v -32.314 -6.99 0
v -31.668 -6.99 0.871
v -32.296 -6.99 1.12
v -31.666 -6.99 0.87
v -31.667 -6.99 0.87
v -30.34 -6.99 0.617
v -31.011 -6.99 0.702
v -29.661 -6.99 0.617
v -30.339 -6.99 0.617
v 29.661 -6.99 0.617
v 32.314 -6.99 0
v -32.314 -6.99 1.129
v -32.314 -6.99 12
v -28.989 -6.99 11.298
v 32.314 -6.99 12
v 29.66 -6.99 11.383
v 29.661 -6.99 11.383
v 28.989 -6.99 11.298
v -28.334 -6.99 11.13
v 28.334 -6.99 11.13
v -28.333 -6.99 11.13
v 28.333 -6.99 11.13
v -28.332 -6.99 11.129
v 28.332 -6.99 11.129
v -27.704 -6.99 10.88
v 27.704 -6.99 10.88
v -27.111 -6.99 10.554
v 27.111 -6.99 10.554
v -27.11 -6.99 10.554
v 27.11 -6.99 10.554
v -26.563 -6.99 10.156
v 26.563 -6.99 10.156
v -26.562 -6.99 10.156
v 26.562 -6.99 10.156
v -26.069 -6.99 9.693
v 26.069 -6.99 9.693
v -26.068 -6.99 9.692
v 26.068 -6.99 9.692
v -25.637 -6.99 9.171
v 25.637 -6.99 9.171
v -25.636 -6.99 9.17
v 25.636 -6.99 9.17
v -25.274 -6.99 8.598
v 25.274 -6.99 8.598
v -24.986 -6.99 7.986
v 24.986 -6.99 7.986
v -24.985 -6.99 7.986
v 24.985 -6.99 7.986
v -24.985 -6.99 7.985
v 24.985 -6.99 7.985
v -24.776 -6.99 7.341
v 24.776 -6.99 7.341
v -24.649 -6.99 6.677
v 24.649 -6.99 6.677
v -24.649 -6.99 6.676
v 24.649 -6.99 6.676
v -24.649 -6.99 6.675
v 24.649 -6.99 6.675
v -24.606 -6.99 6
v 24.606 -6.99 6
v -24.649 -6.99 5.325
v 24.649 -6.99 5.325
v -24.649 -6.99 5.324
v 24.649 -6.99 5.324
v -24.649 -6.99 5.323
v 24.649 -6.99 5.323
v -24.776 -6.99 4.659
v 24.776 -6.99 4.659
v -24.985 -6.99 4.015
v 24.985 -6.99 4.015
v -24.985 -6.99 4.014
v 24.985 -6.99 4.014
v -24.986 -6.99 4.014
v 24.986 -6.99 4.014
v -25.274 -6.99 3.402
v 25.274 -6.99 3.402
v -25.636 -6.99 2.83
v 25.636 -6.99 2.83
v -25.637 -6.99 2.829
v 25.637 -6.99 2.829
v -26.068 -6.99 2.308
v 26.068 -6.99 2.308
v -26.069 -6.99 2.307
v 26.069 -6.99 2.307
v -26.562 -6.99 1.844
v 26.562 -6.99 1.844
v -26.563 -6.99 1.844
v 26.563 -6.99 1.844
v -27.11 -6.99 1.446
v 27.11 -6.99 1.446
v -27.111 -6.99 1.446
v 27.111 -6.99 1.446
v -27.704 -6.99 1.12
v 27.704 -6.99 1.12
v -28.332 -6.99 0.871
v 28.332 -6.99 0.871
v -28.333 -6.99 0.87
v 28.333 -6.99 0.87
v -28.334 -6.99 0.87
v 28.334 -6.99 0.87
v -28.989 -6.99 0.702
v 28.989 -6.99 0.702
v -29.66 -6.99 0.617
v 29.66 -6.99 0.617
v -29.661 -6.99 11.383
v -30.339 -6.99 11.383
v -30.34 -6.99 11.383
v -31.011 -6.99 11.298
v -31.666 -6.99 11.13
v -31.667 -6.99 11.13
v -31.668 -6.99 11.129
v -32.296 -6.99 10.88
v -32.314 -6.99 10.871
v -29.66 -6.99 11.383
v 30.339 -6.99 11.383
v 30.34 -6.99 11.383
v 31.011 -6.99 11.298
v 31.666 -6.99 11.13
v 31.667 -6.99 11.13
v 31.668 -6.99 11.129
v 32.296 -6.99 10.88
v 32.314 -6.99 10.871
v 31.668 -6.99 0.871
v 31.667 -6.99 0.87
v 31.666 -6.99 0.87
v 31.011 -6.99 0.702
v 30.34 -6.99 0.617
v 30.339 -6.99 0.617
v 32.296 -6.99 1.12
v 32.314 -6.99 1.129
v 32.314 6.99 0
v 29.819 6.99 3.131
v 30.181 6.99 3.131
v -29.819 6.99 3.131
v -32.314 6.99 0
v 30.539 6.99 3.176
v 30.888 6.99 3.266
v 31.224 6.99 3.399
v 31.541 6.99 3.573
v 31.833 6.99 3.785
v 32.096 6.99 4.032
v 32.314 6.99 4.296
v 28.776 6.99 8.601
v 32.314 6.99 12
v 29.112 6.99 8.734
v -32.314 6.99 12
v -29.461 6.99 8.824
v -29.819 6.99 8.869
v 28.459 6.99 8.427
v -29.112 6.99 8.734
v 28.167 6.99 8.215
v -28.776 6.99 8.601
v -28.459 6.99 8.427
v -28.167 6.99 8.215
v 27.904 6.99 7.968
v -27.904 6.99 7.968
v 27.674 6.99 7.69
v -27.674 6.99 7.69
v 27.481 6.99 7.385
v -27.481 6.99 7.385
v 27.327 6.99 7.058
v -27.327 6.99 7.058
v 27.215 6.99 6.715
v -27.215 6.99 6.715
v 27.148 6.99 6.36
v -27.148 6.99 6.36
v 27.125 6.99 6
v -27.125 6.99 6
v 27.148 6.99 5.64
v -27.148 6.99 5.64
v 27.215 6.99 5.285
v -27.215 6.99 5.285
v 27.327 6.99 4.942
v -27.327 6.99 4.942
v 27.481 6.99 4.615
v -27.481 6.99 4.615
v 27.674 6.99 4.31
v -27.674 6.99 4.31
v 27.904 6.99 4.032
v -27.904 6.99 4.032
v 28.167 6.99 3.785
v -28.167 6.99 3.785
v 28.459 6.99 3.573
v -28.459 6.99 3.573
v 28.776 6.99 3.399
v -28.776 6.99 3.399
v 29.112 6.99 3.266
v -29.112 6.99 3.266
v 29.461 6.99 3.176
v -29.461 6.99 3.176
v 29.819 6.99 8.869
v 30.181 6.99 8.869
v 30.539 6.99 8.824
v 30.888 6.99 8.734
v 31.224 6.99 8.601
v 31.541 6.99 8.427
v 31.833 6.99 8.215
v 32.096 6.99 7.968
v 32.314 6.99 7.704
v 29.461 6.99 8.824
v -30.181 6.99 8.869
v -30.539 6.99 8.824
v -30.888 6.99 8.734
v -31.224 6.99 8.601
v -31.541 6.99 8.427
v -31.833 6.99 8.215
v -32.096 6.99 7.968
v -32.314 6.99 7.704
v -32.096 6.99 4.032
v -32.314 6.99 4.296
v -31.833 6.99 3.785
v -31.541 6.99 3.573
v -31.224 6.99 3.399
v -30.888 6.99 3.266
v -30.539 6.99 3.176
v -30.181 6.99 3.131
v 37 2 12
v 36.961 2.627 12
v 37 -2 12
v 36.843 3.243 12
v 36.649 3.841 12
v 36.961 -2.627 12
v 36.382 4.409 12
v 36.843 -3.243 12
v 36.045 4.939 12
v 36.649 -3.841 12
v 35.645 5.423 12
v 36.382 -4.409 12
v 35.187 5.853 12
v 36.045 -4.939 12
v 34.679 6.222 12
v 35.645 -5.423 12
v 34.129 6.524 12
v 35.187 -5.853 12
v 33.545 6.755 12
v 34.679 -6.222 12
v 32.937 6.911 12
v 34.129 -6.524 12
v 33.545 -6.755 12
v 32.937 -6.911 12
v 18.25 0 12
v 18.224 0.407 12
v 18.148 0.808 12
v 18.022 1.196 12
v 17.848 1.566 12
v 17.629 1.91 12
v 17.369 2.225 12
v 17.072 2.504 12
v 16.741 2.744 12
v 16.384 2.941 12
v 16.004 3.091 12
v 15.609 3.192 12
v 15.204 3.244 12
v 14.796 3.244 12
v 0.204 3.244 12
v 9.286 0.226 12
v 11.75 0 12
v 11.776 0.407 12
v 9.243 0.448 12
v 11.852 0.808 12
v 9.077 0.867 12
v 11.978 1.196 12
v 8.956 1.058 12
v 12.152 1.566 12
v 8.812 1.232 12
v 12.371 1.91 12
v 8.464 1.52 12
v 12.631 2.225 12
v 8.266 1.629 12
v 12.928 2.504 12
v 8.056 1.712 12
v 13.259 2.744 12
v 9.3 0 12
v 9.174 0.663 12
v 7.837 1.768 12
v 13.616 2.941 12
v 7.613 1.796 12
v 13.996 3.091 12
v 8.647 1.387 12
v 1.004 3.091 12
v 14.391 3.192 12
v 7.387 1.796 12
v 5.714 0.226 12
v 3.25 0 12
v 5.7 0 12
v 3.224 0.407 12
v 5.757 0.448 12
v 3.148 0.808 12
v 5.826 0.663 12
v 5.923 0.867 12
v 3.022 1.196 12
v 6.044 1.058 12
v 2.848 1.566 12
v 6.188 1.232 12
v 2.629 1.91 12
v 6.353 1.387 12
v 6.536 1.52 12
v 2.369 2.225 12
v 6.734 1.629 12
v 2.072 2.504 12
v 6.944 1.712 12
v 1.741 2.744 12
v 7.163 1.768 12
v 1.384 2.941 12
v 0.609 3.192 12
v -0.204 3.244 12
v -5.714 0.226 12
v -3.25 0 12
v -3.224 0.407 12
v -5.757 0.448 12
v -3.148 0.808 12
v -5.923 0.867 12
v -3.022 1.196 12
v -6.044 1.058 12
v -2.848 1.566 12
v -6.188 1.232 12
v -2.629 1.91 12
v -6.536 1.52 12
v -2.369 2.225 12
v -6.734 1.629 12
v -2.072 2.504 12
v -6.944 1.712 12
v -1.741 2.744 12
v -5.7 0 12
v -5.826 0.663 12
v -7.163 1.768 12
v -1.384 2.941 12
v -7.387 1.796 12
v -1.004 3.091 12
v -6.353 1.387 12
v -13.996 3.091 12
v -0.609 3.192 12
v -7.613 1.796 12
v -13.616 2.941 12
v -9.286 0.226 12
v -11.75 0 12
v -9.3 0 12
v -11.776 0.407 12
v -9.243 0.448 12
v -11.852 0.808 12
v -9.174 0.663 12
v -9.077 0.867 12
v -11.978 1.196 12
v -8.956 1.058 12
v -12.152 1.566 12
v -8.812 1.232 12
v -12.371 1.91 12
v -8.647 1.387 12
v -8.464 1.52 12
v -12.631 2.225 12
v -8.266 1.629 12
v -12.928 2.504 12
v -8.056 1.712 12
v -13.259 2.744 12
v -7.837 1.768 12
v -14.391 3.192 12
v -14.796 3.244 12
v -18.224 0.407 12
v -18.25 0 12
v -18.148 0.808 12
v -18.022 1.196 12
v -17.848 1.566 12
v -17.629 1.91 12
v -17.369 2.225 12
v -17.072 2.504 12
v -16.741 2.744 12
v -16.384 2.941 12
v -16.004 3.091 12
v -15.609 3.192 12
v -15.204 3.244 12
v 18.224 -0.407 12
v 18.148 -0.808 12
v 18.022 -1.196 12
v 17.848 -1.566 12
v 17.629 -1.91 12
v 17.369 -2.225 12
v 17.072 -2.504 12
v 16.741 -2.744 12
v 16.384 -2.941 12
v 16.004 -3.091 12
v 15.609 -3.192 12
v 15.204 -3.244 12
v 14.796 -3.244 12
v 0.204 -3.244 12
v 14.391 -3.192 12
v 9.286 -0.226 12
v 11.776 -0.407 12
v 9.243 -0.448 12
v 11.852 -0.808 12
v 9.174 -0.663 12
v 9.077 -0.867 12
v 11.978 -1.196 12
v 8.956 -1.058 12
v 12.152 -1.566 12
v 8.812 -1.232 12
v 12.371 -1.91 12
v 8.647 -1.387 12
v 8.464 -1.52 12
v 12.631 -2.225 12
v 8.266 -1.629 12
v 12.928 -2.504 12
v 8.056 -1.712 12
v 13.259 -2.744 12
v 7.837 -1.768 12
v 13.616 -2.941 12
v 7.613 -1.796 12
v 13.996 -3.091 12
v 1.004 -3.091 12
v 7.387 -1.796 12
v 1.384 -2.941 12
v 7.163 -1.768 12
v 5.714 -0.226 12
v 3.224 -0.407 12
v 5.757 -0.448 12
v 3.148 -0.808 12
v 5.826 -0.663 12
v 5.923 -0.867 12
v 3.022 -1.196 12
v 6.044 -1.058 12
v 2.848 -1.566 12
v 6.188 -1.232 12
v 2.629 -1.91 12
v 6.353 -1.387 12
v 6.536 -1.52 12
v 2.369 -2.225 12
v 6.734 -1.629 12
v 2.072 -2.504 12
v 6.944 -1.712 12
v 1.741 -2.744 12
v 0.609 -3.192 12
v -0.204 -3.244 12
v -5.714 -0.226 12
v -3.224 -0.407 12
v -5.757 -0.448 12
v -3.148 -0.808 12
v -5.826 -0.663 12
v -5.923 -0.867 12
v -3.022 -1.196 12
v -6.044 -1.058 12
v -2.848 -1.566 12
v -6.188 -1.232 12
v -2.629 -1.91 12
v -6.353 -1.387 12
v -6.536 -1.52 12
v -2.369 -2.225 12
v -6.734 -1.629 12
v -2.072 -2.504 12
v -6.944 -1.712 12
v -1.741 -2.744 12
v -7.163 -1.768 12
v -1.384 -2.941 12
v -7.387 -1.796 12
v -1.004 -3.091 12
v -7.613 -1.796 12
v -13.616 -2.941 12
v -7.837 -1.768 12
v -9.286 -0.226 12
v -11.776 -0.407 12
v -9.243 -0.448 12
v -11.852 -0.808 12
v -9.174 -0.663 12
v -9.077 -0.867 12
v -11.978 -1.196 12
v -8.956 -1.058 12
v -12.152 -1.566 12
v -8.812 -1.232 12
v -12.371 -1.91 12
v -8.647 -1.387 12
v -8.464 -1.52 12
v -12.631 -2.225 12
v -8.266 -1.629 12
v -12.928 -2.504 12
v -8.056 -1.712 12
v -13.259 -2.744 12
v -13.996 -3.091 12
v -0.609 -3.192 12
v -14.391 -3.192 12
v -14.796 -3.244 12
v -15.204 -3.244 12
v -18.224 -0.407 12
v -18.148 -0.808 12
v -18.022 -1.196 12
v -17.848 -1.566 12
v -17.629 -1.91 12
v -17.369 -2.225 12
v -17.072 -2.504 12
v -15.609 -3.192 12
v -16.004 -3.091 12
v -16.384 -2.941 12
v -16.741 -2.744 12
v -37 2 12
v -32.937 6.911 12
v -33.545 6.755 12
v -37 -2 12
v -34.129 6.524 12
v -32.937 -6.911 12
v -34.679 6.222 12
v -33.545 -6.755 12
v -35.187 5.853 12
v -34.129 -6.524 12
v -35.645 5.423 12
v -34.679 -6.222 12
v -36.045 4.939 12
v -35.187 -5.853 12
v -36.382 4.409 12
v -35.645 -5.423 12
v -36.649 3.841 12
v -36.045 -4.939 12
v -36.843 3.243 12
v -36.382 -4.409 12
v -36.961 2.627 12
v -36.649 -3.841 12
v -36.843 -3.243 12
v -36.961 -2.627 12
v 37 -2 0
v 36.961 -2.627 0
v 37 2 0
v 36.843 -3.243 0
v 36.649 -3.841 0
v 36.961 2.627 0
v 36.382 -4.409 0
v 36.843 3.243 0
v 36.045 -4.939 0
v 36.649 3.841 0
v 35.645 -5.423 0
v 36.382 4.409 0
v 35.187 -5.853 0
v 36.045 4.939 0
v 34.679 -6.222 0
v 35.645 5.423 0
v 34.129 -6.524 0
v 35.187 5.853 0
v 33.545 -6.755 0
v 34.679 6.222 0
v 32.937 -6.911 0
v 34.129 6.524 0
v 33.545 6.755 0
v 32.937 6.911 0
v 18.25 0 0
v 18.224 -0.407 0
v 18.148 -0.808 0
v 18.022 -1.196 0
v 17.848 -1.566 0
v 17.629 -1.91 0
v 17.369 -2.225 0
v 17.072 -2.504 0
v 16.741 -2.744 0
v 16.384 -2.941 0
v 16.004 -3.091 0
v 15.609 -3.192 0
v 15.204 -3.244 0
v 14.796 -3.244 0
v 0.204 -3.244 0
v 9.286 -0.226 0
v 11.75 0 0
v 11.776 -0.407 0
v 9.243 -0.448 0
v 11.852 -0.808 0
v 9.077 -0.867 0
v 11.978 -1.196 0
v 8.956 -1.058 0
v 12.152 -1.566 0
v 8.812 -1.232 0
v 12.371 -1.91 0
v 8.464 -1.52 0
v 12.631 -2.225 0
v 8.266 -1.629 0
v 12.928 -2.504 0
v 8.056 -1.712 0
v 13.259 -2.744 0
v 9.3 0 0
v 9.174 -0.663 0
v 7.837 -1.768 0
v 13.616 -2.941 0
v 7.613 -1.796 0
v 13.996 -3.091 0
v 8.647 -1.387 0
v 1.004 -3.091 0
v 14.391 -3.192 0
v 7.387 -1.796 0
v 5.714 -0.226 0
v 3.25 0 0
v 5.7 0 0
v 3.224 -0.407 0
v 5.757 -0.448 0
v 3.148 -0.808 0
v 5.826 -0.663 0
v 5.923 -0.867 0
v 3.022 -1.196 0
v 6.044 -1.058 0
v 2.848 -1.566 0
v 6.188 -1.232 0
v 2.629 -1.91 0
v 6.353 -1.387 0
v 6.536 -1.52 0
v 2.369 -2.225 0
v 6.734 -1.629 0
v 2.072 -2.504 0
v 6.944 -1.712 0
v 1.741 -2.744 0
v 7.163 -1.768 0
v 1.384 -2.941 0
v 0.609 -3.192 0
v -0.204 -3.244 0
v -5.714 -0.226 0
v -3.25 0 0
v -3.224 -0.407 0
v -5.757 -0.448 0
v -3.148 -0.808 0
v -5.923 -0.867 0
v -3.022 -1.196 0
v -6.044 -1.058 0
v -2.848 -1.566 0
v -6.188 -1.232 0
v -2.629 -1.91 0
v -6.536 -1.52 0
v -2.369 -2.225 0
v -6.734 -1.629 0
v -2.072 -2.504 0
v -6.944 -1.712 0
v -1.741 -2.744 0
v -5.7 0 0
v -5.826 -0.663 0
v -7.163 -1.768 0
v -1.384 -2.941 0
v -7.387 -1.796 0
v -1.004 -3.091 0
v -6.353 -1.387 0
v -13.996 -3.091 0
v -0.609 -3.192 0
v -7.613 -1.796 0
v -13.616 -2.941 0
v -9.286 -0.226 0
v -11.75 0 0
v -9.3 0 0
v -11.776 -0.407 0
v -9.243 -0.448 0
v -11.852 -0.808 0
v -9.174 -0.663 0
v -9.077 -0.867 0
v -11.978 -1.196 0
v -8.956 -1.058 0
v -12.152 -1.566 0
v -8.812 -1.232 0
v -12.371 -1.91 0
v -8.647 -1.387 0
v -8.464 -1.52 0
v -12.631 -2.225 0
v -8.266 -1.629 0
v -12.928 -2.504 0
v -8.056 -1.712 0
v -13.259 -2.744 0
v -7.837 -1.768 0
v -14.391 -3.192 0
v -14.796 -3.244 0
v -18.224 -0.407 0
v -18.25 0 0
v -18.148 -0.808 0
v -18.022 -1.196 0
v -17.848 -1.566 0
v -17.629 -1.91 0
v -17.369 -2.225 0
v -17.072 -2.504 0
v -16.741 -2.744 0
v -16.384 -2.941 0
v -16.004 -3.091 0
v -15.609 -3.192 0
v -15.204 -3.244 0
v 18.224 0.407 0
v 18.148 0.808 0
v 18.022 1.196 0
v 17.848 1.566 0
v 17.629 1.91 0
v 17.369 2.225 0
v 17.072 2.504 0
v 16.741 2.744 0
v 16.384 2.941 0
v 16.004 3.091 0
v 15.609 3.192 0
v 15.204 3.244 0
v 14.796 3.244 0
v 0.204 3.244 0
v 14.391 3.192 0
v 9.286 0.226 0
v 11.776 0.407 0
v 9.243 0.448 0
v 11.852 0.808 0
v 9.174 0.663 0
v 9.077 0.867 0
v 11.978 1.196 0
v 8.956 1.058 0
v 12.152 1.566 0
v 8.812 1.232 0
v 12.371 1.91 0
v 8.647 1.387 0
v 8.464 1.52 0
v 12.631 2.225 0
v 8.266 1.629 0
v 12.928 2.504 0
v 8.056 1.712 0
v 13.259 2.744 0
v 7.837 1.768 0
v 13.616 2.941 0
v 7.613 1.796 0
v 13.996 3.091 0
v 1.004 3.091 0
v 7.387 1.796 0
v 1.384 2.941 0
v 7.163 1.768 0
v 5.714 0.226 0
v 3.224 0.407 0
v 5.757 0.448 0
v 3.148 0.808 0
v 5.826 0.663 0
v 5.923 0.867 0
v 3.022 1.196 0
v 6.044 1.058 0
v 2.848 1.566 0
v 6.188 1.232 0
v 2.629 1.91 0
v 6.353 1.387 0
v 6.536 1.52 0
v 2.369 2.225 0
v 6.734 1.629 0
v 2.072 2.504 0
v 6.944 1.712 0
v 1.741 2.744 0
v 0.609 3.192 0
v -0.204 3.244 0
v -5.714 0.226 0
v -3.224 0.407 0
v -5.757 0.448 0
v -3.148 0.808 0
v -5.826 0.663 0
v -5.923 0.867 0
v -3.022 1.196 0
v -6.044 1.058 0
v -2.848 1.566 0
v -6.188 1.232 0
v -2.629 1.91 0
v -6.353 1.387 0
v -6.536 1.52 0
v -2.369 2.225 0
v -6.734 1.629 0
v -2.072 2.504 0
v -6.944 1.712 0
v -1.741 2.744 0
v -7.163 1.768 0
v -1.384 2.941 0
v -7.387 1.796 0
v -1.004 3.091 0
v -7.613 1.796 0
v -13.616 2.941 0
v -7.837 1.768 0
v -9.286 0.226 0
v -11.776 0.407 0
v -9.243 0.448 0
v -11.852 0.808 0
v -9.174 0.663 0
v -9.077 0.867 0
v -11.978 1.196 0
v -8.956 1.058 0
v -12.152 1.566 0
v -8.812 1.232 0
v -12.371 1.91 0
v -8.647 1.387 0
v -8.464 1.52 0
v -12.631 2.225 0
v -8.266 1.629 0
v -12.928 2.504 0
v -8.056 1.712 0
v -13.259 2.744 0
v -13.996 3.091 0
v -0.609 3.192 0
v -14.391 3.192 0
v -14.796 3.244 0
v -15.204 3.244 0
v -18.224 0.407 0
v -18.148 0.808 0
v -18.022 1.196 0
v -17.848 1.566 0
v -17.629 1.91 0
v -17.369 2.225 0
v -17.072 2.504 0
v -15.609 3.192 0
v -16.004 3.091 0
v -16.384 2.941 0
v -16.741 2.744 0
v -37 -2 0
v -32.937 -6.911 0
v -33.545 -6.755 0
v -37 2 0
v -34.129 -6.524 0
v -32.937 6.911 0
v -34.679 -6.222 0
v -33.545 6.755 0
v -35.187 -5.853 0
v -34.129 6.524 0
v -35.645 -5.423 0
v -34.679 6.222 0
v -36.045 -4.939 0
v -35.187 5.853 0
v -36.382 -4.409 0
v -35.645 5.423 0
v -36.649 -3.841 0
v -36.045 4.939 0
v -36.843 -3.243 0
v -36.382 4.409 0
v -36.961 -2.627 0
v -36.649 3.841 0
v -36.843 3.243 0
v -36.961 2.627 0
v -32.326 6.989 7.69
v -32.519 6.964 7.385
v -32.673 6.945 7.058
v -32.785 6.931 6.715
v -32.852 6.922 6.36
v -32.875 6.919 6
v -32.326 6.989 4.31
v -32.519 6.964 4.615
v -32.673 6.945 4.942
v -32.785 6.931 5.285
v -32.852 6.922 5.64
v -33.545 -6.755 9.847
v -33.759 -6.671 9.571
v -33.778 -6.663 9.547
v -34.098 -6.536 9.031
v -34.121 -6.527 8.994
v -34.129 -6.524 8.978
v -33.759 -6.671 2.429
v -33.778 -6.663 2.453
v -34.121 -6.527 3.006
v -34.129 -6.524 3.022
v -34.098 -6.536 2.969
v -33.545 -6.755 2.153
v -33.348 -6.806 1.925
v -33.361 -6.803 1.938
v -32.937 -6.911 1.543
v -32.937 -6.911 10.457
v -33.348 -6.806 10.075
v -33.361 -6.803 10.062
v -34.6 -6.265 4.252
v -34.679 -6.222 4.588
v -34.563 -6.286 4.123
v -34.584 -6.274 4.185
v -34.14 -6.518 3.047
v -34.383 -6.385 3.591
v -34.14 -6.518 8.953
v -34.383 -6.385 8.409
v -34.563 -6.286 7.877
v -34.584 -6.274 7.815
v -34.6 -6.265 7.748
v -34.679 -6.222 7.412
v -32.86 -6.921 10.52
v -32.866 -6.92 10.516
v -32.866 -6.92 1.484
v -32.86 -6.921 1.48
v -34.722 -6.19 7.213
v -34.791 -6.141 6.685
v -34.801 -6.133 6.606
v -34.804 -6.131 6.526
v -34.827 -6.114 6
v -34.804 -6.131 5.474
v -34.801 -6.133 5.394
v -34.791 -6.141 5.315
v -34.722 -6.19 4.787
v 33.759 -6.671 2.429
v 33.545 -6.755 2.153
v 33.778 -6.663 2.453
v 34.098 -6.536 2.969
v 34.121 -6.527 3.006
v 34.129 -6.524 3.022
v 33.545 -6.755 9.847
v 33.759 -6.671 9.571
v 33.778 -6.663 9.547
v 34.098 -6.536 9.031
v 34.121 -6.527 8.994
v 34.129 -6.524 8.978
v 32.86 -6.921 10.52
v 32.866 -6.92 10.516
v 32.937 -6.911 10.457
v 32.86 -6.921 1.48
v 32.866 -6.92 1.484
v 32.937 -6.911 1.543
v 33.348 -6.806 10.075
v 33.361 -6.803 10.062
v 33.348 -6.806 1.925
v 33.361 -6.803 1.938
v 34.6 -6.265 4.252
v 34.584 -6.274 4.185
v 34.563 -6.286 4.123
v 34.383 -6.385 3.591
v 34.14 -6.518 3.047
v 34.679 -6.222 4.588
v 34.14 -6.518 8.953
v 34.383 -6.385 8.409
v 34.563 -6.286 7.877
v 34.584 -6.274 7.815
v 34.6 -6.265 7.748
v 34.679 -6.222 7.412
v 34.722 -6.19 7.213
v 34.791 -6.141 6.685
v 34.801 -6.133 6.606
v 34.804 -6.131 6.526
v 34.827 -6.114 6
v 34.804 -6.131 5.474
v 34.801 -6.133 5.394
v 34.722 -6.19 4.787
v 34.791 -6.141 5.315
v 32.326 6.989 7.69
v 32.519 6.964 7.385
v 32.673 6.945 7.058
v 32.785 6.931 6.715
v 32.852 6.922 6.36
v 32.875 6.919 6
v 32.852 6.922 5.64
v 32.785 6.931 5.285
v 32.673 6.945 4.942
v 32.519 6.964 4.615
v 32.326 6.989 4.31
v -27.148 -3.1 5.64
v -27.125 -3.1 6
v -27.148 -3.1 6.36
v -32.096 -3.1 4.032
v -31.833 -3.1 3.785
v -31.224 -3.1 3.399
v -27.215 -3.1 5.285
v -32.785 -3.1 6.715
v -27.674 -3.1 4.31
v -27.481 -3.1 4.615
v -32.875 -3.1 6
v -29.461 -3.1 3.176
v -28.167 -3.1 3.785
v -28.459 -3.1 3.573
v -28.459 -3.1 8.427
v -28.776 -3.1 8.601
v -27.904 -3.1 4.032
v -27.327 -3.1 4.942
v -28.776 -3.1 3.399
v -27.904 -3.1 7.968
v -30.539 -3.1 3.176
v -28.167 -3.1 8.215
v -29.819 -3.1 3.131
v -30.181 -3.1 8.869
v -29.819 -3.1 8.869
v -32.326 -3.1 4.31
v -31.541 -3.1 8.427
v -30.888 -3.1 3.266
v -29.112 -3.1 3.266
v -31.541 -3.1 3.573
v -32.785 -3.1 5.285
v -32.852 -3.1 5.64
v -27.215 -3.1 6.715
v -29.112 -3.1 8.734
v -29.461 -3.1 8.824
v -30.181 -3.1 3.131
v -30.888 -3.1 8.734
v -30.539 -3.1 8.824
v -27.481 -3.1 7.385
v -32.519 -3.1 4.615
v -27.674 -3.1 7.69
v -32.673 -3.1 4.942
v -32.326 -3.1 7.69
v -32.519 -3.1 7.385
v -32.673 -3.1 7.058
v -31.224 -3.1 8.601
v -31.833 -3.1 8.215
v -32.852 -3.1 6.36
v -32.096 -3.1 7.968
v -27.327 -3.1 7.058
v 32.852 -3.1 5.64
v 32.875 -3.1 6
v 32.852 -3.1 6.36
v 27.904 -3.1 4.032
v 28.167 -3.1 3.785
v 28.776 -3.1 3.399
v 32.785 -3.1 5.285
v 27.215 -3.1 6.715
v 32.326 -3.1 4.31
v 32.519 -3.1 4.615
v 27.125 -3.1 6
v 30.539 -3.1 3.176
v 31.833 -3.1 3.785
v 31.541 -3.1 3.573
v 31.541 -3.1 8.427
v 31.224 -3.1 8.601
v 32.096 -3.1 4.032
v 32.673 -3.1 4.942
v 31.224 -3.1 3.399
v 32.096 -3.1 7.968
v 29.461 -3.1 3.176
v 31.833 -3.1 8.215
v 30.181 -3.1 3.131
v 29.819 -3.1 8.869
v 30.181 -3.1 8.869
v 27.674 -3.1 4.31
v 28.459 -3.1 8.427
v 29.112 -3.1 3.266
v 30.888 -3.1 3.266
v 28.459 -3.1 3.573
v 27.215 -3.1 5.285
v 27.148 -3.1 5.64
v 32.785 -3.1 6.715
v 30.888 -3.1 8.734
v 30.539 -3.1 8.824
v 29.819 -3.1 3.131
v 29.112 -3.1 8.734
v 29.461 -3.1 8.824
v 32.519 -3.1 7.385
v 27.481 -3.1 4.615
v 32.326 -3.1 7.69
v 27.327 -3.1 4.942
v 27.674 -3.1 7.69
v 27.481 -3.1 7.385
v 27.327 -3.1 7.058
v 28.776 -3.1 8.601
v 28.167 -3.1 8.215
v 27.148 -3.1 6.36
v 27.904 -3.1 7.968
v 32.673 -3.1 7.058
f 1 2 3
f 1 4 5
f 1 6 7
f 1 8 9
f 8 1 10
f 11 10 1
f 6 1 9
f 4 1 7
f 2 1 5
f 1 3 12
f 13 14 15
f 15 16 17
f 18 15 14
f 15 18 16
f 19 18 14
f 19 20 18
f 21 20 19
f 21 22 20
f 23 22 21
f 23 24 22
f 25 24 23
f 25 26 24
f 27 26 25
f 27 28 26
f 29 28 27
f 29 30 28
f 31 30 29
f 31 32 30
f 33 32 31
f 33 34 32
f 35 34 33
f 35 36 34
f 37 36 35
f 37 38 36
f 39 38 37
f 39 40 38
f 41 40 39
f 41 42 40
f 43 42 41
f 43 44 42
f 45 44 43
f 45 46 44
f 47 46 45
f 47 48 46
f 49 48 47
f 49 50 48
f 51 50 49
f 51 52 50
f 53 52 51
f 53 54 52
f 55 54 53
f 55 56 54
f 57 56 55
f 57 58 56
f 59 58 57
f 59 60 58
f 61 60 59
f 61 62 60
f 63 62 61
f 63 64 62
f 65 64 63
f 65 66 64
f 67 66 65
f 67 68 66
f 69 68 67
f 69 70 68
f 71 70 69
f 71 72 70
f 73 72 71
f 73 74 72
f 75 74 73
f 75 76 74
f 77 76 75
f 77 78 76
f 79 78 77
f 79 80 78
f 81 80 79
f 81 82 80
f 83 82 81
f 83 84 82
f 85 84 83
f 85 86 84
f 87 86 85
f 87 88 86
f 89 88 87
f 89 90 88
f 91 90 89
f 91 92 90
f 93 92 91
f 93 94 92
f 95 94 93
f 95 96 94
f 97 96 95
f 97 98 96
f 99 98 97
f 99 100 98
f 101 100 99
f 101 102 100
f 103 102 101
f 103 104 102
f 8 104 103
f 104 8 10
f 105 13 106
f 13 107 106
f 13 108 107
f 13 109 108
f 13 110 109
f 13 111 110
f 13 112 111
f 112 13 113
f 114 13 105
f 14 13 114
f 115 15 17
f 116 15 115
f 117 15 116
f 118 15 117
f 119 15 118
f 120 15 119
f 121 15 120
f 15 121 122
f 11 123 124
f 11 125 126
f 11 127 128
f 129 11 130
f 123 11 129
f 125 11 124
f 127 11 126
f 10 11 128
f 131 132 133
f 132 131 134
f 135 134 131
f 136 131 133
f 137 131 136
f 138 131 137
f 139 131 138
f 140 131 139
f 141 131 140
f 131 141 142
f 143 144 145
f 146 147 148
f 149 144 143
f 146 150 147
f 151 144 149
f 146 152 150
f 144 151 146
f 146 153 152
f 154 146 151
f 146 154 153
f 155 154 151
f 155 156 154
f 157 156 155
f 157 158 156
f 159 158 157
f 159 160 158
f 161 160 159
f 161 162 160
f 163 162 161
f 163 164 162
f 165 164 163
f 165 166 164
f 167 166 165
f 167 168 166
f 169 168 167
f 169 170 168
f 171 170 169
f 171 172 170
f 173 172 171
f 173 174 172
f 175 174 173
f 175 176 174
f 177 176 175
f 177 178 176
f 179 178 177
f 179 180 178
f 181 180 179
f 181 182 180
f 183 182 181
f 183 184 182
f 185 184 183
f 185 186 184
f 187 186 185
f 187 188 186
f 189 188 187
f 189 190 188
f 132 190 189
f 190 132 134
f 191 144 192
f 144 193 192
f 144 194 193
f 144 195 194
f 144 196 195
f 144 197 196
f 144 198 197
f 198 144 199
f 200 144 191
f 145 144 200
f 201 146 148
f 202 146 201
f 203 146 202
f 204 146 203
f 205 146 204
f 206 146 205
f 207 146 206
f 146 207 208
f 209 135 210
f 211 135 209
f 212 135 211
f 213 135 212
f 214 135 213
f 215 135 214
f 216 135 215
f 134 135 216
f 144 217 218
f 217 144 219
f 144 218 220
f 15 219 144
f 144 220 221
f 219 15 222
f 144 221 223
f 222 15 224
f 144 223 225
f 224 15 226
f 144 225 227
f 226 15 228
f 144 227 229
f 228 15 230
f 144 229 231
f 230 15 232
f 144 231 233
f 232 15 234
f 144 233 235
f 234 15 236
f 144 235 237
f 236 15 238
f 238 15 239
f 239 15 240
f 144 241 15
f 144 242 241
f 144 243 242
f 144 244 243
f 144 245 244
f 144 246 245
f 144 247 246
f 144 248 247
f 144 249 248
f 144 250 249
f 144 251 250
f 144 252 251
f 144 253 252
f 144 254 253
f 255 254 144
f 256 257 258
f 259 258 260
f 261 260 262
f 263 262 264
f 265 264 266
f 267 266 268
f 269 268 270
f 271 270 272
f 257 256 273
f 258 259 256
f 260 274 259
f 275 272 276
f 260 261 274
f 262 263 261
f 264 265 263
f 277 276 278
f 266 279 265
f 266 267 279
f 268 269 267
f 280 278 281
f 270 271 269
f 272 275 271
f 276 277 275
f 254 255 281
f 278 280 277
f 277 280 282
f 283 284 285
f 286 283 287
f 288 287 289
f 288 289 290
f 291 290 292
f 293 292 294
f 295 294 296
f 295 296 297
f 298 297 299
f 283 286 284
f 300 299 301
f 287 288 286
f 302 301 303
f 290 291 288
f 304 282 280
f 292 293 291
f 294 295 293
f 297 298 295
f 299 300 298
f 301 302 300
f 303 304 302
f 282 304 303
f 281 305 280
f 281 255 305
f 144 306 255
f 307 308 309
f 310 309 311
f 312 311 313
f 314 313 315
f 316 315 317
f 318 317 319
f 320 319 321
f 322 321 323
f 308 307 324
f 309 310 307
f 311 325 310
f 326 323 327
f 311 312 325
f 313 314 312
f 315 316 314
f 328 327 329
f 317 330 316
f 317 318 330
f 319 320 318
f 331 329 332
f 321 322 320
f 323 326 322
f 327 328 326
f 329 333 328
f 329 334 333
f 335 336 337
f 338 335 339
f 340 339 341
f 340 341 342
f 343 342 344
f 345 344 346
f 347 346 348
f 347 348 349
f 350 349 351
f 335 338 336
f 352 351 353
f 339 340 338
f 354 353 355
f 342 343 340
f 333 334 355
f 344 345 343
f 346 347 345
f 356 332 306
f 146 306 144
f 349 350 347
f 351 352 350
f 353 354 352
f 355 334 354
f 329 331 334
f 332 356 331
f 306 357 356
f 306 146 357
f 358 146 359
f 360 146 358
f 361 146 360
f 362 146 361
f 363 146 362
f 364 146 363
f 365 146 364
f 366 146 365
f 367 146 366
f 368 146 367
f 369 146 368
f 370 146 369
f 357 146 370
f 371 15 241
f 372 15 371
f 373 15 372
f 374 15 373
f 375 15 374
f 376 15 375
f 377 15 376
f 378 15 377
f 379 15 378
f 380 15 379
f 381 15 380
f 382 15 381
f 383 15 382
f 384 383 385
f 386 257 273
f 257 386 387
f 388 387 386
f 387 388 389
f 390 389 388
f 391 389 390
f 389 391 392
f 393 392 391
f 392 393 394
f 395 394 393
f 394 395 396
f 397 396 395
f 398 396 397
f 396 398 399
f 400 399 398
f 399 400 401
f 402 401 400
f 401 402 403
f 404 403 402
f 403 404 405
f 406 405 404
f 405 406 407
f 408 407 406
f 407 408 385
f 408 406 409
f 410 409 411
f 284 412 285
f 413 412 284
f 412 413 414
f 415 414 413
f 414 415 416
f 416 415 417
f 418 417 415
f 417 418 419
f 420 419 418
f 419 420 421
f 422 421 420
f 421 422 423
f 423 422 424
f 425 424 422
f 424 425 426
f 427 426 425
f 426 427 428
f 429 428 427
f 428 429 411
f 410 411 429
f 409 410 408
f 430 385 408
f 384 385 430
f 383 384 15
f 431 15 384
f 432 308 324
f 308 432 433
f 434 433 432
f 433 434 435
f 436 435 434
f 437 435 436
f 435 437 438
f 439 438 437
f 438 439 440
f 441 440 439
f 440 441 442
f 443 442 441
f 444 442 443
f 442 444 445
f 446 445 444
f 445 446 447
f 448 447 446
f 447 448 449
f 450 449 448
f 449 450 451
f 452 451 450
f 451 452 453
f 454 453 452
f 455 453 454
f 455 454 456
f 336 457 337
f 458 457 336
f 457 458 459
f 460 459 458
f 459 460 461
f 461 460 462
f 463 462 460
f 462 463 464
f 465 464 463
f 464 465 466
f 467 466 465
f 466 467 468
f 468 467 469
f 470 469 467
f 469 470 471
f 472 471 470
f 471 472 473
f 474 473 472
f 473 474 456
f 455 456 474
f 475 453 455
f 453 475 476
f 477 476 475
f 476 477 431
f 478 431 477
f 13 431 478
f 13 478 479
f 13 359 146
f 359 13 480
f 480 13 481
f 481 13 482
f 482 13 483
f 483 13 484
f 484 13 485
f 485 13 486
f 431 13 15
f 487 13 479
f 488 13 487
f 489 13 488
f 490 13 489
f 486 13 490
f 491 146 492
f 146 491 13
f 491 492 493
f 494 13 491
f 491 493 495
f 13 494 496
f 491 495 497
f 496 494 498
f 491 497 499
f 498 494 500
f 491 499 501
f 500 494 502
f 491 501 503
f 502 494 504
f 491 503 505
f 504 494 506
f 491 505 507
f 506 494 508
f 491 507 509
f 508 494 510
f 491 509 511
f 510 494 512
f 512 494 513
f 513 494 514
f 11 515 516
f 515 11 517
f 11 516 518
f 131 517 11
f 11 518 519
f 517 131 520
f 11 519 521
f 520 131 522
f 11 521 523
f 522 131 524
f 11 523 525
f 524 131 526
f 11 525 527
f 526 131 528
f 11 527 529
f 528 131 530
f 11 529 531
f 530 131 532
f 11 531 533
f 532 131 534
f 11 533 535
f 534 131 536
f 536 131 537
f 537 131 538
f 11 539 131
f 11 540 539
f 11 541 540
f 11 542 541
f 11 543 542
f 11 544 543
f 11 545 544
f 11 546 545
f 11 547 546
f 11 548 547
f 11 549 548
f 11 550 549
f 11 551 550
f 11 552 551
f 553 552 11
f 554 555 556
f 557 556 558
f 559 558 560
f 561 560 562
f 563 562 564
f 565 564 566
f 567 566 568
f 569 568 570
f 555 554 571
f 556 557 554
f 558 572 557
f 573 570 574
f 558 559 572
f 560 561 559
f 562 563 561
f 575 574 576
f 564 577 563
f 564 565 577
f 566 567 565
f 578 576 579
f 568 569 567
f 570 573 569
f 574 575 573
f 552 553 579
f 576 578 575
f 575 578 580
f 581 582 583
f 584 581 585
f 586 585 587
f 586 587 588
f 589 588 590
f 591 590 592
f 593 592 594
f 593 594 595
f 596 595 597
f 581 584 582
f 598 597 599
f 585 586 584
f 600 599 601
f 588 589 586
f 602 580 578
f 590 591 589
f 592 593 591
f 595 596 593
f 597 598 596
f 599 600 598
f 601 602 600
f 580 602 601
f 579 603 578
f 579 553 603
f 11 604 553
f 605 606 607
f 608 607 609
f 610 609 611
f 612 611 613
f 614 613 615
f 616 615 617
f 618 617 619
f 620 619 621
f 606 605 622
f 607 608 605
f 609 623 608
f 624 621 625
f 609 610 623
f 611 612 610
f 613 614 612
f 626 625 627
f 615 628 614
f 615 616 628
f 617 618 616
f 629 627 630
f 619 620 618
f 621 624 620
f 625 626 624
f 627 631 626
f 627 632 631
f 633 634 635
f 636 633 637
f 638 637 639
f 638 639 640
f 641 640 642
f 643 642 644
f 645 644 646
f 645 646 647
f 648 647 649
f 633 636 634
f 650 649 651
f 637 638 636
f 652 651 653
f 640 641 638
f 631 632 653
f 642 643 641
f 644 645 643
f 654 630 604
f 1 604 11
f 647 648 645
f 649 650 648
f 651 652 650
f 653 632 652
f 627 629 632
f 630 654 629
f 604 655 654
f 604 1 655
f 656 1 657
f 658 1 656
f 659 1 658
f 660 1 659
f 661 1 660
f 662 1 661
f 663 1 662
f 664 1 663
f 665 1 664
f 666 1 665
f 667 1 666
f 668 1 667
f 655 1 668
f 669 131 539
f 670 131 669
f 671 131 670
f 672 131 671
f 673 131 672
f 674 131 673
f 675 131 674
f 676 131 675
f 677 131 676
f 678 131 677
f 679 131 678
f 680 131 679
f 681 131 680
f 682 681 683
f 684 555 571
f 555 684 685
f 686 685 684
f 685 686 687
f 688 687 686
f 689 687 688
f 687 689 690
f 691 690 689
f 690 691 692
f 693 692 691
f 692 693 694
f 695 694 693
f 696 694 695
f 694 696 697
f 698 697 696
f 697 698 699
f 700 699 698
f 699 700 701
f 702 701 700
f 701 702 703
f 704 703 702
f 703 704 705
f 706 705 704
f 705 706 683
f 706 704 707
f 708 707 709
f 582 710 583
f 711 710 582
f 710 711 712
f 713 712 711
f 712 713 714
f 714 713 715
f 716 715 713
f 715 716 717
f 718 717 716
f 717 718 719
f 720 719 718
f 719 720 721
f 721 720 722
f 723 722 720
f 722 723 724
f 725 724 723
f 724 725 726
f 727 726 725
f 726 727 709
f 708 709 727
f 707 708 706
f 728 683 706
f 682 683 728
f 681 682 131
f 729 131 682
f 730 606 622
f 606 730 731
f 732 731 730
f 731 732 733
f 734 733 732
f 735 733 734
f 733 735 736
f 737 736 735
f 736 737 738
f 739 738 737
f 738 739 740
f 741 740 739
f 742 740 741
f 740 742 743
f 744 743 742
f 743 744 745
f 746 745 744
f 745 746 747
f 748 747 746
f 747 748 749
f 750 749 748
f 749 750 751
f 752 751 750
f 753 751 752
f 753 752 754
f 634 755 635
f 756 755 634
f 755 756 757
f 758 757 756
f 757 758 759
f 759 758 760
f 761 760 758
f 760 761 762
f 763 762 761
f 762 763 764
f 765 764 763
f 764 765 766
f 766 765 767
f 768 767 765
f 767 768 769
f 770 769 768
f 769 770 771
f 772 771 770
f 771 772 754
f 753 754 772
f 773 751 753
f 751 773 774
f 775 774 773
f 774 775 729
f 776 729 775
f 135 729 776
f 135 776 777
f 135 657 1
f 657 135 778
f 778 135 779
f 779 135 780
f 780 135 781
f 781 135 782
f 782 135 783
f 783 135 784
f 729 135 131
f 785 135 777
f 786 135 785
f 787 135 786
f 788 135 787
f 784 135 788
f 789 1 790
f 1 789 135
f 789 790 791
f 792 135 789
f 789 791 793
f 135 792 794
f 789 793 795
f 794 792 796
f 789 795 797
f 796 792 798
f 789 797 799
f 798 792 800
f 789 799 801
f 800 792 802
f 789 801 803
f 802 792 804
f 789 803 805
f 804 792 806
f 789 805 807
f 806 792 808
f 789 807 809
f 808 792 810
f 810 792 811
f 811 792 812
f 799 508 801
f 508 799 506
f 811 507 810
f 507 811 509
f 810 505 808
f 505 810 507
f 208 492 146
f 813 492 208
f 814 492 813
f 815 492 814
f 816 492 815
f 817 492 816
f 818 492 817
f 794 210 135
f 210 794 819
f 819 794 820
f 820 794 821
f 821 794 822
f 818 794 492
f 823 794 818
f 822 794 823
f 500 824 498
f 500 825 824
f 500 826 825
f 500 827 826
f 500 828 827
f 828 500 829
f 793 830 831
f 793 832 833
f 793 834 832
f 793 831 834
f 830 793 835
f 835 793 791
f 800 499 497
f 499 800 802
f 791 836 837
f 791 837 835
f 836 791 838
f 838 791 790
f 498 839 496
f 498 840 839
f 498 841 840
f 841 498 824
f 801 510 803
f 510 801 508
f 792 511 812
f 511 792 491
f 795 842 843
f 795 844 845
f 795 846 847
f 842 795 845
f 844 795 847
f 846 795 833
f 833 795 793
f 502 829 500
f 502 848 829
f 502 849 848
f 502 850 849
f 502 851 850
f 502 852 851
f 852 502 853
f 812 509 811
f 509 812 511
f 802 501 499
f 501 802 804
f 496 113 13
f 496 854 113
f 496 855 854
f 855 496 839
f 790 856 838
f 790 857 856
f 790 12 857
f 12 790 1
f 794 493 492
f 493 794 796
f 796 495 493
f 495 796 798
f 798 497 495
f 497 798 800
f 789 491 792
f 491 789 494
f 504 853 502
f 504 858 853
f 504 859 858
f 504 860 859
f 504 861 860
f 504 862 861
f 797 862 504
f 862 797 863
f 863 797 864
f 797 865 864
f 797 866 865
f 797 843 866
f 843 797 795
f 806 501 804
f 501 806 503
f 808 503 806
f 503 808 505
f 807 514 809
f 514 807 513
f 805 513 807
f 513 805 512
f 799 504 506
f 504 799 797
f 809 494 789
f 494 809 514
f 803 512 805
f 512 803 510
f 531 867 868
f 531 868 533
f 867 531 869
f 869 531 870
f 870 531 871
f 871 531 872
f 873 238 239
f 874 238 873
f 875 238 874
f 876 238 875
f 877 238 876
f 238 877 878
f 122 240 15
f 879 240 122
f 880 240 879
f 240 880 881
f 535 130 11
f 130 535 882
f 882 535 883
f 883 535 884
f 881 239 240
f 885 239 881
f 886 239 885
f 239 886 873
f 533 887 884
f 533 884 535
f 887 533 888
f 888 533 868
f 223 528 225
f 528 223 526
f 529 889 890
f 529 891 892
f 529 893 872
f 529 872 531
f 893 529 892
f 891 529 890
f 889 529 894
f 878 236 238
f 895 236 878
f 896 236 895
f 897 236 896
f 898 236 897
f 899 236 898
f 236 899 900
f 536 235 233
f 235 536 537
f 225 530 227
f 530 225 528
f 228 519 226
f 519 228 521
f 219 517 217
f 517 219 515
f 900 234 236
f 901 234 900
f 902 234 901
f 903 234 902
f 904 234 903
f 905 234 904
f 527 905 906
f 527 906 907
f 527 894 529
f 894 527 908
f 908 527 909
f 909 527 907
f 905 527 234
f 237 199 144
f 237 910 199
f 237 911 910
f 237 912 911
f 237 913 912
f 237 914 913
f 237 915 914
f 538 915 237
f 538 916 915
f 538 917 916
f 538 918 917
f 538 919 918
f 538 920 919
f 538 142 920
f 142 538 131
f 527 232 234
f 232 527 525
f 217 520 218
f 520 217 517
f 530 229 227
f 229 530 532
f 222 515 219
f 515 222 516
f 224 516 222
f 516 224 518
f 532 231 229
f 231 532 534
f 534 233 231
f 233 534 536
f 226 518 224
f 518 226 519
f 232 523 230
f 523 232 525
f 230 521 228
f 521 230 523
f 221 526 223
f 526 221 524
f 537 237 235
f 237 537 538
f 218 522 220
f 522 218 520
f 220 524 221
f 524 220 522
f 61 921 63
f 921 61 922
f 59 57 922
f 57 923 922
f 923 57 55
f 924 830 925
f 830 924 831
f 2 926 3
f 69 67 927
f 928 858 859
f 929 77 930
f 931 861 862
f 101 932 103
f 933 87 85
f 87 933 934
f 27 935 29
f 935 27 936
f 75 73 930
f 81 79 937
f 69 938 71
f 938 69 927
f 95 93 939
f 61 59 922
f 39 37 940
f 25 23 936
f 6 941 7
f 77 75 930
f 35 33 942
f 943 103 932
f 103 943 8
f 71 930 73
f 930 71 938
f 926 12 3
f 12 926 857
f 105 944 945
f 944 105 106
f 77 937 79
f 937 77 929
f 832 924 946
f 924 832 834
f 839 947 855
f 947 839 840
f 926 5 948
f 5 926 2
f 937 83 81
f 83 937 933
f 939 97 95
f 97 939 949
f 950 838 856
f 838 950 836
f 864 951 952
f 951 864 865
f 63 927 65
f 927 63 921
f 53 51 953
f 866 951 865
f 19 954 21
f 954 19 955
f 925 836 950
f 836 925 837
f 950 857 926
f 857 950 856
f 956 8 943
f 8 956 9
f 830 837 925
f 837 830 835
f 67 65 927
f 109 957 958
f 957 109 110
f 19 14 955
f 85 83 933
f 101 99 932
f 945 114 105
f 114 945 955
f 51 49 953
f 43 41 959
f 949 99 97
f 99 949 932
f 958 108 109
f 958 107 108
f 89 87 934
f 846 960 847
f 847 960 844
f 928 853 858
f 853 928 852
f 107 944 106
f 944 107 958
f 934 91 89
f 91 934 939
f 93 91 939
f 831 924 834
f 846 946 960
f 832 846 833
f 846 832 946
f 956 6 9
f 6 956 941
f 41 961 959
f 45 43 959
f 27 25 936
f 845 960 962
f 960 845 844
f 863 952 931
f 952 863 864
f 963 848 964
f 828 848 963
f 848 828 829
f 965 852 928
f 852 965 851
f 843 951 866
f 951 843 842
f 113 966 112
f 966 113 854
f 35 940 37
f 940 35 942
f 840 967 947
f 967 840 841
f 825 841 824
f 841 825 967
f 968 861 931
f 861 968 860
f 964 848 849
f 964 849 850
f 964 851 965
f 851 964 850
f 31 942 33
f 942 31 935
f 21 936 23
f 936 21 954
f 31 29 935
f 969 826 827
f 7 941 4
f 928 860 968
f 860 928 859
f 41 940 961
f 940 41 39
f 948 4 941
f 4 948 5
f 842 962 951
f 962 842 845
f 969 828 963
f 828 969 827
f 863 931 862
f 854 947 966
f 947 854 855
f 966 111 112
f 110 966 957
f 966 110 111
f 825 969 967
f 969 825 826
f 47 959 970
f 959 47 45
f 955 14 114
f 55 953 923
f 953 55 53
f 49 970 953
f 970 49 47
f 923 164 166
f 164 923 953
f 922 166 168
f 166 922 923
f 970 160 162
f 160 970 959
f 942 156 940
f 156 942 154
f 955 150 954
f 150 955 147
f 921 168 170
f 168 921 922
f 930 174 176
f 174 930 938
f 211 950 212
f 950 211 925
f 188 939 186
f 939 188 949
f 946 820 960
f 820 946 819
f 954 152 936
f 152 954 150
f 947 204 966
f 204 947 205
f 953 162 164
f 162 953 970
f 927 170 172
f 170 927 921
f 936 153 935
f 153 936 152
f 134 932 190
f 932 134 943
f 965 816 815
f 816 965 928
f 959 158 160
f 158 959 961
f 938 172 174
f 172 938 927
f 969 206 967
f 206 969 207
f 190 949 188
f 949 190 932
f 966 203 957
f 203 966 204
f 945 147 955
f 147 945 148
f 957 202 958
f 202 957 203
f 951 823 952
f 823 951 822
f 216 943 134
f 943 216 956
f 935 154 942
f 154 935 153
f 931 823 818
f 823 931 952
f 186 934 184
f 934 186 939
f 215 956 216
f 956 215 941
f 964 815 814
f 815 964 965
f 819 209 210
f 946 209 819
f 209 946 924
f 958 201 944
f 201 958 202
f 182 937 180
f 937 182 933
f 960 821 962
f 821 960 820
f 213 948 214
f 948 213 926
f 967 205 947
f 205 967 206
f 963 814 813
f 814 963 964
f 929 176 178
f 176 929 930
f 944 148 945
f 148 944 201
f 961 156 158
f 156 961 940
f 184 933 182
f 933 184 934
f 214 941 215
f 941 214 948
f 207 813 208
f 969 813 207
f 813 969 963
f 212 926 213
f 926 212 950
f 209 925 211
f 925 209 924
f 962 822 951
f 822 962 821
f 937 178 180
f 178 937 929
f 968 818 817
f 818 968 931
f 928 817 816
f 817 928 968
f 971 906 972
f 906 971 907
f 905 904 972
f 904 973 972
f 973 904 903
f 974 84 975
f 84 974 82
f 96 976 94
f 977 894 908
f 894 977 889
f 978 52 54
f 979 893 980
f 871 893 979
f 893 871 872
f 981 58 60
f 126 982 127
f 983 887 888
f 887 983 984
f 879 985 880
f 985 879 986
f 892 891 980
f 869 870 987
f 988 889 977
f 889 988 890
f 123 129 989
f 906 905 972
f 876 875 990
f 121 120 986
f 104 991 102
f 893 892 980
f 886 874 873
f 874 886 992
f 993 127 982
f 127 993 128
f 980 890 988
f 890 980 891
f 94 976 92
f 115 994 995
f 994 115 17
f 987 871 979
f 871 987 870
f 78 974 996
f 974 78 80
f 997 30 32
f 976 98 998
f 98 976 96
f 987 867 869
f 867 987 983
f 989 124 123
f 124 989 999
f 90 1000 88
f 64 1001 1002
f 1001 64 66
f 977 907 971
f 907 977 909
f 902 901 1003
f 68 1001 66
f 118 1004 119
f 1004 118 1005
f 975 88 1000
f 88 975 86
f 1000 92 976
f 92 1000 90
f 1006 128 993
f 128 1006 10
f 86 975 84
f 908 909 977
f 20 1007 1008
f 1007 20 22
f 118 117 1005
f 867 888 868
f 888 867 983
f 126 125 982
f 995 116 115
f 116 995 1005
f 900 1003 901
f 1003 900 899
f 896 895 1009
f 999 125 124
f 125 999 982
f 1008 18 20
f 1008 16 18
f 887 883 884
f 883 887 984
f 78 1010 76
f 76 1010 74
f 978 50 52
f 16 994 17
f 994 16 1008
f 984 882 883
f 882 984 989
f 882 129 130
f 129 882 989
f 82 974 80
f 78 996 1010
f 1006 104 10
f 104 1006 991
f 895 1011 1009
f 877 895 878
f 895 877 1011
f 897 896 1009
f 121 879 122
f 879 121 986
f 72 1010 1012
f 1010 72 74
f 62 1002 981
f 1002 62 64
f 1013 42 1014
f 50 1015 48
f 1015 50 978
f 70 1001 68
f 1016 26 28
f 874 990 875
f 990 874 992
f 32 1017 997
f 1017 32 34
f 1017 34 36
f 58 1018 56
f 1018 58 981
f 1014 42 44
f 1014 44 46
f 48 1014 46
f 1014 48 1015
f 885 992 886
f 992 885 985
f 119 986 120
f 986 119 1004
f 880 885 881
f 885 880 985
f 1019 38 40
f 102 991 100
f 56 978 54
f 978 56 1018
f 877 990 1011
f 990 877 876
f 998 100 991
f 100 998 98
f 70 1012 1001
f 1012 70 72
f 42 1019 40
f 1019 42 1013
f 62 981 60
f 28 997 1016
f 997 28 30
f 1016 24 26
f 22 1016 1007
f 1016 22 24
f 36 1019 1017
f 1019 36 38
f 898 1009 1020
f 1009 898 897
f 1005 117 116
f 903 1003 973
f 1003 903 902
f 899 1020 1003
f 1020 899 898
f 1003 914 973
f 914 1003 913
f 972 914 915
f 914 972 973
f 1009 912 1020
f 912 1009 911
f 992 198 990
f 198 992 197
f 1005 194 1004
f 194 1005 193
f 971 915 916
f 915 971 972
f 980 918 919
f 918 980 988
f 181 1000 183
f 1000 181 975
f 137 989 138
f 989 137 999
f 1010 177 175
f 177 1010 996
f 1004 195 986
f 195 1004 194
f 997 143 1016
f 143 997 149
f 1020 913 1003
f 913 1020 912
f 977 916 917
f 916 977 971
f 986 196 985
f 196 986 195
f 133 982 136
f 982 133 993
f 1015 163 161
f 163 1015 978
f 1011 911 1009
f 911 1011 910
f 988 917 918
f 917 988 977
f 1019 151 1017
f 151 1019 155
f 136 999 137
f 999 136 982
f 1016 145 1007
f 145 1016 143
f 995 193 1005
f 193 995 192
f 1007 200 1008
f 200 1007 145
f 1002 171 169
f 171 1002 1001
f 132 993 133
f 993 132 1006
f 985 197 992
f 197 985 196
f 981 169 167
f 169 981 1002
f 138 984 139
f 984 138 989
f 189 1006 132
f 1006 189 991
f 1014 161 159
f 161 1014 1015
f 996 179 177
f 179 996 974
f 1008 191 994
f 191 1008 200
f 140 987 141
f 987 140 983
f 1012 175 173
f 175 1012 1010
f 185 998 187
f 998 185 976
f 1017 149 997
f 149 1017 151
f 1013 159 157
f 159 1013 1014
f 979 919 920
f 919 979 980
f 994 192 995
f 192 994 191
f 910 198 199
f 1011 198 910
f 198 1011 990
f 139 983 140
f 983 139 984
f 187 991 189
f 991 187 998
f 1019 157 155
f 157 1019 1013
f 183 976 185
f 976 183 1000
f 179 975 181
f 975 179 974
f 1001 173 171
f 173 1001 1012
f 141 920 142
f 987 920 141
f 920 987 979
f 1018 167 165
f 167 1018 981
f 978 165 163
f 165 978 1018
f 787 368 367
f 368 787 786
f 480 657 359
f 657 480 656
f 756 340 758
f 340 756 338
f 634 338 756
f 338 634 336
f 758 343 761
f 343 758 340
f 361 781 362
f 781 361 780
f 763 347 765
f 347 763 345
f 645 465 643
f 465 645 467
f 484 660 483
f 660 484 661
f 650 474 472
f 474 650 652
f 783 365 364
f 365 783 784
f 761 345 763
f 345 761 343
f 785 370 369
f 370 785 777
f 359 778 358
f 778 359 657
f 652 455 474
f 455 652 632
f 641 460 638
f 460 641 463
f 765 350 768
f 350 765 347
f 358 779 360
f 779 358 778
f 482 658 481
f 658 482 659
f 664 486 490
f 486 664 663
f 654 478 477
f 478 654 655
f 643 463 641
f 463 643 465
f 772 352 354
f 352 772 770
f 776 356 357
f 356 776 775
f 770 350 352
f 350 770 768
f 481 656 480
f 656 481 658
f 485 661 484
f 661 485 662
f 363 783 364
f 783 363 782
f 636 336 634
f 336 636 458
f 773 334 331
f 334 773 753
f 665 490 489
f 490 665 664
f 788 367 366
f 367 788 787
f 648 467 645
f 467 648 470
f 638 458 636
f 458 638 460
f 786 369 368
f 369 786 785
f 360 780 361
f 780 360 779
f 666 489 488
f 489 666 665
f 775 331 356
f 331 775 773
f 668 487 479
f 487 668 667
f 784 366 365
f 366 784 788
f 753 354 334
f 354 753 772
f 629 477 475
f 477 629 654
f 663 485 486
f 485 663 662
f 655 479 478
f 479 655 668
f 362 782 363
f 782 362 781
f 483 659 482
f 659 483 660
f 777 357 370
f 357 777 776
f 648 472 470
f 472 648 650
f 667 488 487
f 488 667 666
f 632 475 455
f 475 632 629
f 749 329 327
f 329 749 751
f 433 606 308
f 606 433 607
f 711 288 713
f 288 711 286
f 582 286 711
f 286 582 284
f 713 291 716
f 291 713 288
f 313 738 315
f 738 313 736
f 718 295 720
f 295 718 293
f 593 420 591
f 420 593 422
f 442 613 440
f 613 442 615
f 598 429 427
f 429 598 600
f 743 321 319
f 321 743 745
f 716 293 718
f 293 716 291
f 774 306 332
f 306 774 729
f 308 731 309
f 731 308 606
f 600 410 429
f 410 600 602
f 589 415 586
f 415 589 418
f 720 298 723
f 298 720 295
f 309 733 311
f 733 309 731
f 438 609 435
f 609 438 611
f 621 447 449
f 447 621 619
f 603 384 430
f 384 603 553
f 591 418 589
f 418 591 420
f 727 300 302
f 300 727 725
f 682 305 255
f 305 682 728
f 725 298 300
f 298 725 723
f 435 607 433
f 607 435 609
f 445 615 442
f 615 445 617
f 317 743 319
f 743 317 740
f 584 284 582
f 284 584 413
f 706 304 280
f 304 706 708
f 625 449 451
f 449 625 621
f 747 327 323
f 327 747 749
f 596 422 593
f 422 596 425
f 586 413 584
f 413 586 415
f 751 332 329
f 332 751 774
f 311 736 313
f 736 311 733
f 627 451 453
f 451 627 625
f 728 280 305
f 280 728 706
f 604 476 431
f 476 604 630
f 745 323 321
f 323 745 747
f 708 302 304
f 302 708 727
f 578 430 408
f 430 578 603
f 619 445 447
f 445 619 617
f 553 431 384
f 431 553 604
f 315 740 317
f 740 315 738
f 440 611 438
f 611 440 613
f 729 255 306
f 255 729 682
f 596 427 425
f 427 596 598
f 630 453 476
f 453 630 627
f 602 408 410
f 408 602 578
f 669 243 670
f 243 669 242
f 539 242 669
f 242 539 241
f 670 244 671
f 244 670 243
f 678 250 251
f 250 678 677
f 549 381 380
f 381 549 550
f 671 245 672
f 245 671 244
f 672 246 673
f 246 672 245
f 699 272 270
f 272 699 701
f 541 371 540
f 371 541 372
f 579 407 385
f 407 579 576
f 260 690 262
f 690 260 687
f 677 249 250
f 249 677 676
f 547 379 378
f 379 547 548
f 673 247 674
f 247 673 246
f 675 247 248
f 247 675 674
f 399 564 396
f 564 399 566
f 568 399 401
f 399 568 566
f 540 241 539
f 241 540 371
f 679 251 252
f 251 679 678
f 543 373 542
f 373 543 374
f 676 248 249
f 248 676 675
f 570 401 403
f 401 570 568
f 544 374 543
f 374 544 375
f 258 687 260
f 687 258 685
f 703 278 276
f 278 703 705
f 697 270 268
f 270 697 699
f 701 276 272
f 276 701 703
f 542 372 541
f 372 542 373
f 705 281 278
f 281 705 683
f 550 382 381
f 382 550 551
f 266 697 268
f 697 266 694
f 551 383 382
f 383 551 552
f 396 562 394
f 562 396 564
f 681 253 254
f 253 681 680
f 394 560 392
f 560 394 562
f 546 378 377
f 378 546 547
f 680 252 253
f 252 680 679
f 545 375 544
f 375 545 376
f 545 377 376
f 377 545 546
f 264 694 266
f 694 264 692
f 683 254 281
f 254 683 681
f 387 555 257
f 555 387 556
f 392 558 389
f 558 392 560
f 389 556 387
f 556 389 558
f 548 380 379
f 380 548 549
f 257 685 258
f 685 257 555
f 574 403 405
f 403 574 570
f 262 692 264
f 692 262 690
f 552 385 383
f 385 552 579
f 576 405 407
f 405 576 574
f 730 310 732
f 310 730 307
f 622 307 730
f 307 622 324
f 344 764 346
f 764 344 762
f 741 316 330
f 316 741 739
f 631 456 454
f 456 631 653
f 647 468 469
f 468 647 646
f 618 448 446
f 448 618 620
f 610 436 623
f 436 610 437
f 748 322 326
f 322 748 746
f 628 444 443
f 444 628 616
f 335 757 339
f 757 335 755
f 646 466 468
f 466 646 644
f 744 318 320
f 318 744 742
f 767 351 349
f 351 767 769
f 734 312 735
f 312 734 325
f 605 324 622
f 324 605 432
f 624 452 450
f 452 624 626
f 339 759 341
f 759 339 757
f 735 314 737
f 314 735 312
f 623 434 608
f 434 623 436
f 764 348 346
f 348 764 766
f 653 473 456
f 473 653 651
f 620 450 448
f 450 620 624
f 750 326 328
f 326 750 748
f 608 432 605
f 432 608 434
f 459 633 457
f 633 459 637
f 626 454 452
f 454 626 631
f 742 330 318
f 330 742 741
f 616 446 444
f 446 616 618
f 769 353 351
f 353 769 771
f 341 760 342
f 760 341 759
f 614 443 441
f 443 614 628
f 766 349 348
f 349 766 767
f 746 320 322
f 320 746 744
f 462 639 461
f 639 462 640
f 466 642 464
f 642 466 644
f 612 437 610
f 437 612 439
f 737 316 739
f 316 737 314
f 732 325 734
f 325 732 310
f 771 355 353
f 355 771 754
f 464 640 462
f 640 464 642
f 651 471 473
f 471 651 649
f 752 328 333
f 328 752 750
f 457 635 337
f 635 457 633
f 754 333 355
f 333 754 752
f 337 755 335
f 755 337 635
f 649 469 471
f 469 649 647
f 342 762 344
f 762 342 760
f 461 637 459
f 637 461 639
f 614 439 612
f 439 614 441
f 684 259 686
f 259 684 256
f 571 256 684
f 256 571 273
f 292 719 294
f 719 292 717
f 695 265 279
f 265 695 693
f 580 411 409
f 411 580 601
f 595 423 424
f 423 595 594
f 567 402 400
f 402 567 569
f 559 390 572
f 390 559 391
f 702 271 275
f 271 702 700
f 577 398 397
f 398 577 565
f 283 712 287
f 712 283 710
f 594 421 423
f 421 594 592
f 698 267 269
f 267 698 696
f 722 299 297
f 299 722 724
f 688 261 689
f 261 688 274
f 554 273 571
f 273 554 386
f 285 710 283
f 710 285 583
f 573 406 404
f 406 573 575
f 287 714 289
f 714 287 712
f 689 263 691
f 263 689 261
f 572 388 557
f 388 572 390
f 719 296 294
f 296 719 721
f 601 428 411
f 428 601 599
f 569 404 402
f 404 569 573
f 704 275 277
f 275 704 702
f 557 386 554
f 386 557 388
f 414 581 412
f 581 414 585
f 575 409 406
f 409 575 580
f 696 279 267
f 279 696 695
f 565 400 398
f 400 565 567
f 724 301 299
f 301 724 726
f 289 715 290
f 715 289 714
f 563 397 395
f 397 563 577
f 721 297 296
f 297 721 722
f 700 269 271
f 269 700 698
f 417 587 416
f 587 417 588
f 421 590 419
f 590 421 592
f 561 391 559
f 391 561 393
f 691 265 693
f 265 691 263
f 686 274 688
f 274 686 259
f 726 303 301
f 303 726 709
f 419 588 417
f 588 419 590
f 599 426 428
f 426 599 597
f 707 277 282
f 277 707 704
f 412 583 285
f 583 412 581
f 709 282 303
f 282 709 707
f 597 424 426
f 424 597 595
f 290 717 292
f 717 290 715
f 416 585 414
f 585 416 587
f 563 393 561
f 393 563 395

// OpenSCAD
$fn = 50;


difference() {
	union() {
		hull() {
			translate(v = [-17.0000000000, 2.0000000000, 0]) {
				cylinder(h = 12, r = 5);
			}
			translate(v = [17.0000000000, 2.0000000000, 0]) {
				cylinder(h = 12, r = 5);
			}
			translate(v = [-17.0000000000, -2.0000000000, 0]) {
				cylinder(h = 12, r = 5);
			}
			translate(v = [17.0000000000, -2.0000000000, 0]) {
				cylinder(h = 12, r = 5);
			}
		}
		translate(v = [-22.5000000000, 0.0000000000, 0]) {
			hull() {
				translate(v = [-9.5000000000, 2.0000000000, 0]) {
					cylinder(h = 12, r = 5);
				}
				translate(v = [9.5000000000, 2.0000000000, 0]) {
					cylinder(h = 12, r = 5);
				}
				translate(v = [-9.5000000000, -2.0000000000, 0]) {
					cylinder(h = 12, r = 5);
				}
				translate(v = [9.5000000000, -2.0000000000, 0]) {
					cylinder(h = 12, r = 5);
				}
			}
		}
		translate(v = [22.5000000000, 0.0000000000, 0]) {
			hull() {
				translate(v = [-9.5000000000, 2.0000000000, 0]) {
					cylinder(h = 12, r = 5);
				}
				translate(v = [9.5000000000, 2.0000000000, 0]) {
					cylinder(h = 12, r = 5);
				}
				translate(v = [-9.5000000000, -2.0000000000, 0]) {
					cylinder(h = 12, r = 5);
				}
				translate(v = [9.5000000000, -2.0000000000, 0]) {
					cylinder(h = 12, r = 5);
				}
			}
		}
	}
	union() {
		translate(v = [-30.0000000000, -7.0000000000, 6.0000000000]) {
			rotate(a = [90, 0, 0]) {
				difference() {
					union() {
						#translate(v = [0, 0, -14.0000000000]) {
							cylinder(h = 14, r = 2.6000000000);
						}
						#translate(v = [0, 0, -3.9000000000]) {
							cylinder(h = 3.9000000000, r1 = 2.8750000000, r2 = 5.4000000000);
						}
						#translate(v = [0, 0, -14.0000000000]) {
							cylinder(h = 14, r = 2.8750000000);
						}
						#translate(v = [0, 0, -14.0000000000]) {
							cylinder(h = 14, r = 2.6000000000);
						}
					}
					union();
				}
			}
		}
		translate(v = [30.0000000000, -7.0000000000, 6.0000000000]) {
			rotate(a = [90, 0, 0]) {
				difference() {
					union() {
						#translate(v = [0, 0, -14.0000000000]) {
							cylinder(h = 14, r = 2.6000000000);
						}
						#translate(v = [0, 0, -3.9000000000]) {
							cylinder(h = 3.9000000000, r1 = 2.8750000000, r2 = 5.4000000000);
						}
						#translate(v = [0, 0, -14.0000000000]) {
							cylinder(h = 14, r = 2.8750000000);
						}
						#translate(v = [0, 0, -14.0000000000]) {
							cylinder(h = 14, r = 2.6000000000);
						}
					}
					union();
				}
			}
		}
		translate(v = [-15.0000000000, 0.0000000000, 0]) {
			translate(v = [0, 0, -100]) {
				cylinder(h = 200, r = 3.2500000000);
			}
		}
		translate(v = [0, 0, -100]) {
			cylinder(h = 200, r = 3.2500000000);
		}
		translate(v = [15.0000000000, 0.0000000000, 0]) {
			translate(v = [0, 0, -100]) {
				cylinder(h = 200, r = 3.2500000000);
			}
		}
		translate(v = [-15.0000000000, 0.0000000000, 0]) {
			translate(v = [0, 0, -100]) {
				cylinder(h = 200, r = 1.8000000000);
			}
		}
		translate(v = [-7.5000000000, 0.0000000000, 0]) {
			translate(v = [0, 0, -100]) {
				cylinder(h = 200, r = 1.8000000000);
			}
		}
		translate(v = [0, 0, -100]) {
			cylinder(h = 200, r = 1.8000000000);
		}
		translate(v = [7.5000000000, 0.0000000000, 0]) {
			translate(v = [0, 0, -100]) {
				cylinder(h = 200, r = 1.8000000000);
			}
		}
		translate(v = [15.0000000000, 0.0000000000, 0]) {
			translate(v = [0, 0, -100]) {
				cylinder(h = 200, r = 1.8000000000);
			}
		}
	}
}
